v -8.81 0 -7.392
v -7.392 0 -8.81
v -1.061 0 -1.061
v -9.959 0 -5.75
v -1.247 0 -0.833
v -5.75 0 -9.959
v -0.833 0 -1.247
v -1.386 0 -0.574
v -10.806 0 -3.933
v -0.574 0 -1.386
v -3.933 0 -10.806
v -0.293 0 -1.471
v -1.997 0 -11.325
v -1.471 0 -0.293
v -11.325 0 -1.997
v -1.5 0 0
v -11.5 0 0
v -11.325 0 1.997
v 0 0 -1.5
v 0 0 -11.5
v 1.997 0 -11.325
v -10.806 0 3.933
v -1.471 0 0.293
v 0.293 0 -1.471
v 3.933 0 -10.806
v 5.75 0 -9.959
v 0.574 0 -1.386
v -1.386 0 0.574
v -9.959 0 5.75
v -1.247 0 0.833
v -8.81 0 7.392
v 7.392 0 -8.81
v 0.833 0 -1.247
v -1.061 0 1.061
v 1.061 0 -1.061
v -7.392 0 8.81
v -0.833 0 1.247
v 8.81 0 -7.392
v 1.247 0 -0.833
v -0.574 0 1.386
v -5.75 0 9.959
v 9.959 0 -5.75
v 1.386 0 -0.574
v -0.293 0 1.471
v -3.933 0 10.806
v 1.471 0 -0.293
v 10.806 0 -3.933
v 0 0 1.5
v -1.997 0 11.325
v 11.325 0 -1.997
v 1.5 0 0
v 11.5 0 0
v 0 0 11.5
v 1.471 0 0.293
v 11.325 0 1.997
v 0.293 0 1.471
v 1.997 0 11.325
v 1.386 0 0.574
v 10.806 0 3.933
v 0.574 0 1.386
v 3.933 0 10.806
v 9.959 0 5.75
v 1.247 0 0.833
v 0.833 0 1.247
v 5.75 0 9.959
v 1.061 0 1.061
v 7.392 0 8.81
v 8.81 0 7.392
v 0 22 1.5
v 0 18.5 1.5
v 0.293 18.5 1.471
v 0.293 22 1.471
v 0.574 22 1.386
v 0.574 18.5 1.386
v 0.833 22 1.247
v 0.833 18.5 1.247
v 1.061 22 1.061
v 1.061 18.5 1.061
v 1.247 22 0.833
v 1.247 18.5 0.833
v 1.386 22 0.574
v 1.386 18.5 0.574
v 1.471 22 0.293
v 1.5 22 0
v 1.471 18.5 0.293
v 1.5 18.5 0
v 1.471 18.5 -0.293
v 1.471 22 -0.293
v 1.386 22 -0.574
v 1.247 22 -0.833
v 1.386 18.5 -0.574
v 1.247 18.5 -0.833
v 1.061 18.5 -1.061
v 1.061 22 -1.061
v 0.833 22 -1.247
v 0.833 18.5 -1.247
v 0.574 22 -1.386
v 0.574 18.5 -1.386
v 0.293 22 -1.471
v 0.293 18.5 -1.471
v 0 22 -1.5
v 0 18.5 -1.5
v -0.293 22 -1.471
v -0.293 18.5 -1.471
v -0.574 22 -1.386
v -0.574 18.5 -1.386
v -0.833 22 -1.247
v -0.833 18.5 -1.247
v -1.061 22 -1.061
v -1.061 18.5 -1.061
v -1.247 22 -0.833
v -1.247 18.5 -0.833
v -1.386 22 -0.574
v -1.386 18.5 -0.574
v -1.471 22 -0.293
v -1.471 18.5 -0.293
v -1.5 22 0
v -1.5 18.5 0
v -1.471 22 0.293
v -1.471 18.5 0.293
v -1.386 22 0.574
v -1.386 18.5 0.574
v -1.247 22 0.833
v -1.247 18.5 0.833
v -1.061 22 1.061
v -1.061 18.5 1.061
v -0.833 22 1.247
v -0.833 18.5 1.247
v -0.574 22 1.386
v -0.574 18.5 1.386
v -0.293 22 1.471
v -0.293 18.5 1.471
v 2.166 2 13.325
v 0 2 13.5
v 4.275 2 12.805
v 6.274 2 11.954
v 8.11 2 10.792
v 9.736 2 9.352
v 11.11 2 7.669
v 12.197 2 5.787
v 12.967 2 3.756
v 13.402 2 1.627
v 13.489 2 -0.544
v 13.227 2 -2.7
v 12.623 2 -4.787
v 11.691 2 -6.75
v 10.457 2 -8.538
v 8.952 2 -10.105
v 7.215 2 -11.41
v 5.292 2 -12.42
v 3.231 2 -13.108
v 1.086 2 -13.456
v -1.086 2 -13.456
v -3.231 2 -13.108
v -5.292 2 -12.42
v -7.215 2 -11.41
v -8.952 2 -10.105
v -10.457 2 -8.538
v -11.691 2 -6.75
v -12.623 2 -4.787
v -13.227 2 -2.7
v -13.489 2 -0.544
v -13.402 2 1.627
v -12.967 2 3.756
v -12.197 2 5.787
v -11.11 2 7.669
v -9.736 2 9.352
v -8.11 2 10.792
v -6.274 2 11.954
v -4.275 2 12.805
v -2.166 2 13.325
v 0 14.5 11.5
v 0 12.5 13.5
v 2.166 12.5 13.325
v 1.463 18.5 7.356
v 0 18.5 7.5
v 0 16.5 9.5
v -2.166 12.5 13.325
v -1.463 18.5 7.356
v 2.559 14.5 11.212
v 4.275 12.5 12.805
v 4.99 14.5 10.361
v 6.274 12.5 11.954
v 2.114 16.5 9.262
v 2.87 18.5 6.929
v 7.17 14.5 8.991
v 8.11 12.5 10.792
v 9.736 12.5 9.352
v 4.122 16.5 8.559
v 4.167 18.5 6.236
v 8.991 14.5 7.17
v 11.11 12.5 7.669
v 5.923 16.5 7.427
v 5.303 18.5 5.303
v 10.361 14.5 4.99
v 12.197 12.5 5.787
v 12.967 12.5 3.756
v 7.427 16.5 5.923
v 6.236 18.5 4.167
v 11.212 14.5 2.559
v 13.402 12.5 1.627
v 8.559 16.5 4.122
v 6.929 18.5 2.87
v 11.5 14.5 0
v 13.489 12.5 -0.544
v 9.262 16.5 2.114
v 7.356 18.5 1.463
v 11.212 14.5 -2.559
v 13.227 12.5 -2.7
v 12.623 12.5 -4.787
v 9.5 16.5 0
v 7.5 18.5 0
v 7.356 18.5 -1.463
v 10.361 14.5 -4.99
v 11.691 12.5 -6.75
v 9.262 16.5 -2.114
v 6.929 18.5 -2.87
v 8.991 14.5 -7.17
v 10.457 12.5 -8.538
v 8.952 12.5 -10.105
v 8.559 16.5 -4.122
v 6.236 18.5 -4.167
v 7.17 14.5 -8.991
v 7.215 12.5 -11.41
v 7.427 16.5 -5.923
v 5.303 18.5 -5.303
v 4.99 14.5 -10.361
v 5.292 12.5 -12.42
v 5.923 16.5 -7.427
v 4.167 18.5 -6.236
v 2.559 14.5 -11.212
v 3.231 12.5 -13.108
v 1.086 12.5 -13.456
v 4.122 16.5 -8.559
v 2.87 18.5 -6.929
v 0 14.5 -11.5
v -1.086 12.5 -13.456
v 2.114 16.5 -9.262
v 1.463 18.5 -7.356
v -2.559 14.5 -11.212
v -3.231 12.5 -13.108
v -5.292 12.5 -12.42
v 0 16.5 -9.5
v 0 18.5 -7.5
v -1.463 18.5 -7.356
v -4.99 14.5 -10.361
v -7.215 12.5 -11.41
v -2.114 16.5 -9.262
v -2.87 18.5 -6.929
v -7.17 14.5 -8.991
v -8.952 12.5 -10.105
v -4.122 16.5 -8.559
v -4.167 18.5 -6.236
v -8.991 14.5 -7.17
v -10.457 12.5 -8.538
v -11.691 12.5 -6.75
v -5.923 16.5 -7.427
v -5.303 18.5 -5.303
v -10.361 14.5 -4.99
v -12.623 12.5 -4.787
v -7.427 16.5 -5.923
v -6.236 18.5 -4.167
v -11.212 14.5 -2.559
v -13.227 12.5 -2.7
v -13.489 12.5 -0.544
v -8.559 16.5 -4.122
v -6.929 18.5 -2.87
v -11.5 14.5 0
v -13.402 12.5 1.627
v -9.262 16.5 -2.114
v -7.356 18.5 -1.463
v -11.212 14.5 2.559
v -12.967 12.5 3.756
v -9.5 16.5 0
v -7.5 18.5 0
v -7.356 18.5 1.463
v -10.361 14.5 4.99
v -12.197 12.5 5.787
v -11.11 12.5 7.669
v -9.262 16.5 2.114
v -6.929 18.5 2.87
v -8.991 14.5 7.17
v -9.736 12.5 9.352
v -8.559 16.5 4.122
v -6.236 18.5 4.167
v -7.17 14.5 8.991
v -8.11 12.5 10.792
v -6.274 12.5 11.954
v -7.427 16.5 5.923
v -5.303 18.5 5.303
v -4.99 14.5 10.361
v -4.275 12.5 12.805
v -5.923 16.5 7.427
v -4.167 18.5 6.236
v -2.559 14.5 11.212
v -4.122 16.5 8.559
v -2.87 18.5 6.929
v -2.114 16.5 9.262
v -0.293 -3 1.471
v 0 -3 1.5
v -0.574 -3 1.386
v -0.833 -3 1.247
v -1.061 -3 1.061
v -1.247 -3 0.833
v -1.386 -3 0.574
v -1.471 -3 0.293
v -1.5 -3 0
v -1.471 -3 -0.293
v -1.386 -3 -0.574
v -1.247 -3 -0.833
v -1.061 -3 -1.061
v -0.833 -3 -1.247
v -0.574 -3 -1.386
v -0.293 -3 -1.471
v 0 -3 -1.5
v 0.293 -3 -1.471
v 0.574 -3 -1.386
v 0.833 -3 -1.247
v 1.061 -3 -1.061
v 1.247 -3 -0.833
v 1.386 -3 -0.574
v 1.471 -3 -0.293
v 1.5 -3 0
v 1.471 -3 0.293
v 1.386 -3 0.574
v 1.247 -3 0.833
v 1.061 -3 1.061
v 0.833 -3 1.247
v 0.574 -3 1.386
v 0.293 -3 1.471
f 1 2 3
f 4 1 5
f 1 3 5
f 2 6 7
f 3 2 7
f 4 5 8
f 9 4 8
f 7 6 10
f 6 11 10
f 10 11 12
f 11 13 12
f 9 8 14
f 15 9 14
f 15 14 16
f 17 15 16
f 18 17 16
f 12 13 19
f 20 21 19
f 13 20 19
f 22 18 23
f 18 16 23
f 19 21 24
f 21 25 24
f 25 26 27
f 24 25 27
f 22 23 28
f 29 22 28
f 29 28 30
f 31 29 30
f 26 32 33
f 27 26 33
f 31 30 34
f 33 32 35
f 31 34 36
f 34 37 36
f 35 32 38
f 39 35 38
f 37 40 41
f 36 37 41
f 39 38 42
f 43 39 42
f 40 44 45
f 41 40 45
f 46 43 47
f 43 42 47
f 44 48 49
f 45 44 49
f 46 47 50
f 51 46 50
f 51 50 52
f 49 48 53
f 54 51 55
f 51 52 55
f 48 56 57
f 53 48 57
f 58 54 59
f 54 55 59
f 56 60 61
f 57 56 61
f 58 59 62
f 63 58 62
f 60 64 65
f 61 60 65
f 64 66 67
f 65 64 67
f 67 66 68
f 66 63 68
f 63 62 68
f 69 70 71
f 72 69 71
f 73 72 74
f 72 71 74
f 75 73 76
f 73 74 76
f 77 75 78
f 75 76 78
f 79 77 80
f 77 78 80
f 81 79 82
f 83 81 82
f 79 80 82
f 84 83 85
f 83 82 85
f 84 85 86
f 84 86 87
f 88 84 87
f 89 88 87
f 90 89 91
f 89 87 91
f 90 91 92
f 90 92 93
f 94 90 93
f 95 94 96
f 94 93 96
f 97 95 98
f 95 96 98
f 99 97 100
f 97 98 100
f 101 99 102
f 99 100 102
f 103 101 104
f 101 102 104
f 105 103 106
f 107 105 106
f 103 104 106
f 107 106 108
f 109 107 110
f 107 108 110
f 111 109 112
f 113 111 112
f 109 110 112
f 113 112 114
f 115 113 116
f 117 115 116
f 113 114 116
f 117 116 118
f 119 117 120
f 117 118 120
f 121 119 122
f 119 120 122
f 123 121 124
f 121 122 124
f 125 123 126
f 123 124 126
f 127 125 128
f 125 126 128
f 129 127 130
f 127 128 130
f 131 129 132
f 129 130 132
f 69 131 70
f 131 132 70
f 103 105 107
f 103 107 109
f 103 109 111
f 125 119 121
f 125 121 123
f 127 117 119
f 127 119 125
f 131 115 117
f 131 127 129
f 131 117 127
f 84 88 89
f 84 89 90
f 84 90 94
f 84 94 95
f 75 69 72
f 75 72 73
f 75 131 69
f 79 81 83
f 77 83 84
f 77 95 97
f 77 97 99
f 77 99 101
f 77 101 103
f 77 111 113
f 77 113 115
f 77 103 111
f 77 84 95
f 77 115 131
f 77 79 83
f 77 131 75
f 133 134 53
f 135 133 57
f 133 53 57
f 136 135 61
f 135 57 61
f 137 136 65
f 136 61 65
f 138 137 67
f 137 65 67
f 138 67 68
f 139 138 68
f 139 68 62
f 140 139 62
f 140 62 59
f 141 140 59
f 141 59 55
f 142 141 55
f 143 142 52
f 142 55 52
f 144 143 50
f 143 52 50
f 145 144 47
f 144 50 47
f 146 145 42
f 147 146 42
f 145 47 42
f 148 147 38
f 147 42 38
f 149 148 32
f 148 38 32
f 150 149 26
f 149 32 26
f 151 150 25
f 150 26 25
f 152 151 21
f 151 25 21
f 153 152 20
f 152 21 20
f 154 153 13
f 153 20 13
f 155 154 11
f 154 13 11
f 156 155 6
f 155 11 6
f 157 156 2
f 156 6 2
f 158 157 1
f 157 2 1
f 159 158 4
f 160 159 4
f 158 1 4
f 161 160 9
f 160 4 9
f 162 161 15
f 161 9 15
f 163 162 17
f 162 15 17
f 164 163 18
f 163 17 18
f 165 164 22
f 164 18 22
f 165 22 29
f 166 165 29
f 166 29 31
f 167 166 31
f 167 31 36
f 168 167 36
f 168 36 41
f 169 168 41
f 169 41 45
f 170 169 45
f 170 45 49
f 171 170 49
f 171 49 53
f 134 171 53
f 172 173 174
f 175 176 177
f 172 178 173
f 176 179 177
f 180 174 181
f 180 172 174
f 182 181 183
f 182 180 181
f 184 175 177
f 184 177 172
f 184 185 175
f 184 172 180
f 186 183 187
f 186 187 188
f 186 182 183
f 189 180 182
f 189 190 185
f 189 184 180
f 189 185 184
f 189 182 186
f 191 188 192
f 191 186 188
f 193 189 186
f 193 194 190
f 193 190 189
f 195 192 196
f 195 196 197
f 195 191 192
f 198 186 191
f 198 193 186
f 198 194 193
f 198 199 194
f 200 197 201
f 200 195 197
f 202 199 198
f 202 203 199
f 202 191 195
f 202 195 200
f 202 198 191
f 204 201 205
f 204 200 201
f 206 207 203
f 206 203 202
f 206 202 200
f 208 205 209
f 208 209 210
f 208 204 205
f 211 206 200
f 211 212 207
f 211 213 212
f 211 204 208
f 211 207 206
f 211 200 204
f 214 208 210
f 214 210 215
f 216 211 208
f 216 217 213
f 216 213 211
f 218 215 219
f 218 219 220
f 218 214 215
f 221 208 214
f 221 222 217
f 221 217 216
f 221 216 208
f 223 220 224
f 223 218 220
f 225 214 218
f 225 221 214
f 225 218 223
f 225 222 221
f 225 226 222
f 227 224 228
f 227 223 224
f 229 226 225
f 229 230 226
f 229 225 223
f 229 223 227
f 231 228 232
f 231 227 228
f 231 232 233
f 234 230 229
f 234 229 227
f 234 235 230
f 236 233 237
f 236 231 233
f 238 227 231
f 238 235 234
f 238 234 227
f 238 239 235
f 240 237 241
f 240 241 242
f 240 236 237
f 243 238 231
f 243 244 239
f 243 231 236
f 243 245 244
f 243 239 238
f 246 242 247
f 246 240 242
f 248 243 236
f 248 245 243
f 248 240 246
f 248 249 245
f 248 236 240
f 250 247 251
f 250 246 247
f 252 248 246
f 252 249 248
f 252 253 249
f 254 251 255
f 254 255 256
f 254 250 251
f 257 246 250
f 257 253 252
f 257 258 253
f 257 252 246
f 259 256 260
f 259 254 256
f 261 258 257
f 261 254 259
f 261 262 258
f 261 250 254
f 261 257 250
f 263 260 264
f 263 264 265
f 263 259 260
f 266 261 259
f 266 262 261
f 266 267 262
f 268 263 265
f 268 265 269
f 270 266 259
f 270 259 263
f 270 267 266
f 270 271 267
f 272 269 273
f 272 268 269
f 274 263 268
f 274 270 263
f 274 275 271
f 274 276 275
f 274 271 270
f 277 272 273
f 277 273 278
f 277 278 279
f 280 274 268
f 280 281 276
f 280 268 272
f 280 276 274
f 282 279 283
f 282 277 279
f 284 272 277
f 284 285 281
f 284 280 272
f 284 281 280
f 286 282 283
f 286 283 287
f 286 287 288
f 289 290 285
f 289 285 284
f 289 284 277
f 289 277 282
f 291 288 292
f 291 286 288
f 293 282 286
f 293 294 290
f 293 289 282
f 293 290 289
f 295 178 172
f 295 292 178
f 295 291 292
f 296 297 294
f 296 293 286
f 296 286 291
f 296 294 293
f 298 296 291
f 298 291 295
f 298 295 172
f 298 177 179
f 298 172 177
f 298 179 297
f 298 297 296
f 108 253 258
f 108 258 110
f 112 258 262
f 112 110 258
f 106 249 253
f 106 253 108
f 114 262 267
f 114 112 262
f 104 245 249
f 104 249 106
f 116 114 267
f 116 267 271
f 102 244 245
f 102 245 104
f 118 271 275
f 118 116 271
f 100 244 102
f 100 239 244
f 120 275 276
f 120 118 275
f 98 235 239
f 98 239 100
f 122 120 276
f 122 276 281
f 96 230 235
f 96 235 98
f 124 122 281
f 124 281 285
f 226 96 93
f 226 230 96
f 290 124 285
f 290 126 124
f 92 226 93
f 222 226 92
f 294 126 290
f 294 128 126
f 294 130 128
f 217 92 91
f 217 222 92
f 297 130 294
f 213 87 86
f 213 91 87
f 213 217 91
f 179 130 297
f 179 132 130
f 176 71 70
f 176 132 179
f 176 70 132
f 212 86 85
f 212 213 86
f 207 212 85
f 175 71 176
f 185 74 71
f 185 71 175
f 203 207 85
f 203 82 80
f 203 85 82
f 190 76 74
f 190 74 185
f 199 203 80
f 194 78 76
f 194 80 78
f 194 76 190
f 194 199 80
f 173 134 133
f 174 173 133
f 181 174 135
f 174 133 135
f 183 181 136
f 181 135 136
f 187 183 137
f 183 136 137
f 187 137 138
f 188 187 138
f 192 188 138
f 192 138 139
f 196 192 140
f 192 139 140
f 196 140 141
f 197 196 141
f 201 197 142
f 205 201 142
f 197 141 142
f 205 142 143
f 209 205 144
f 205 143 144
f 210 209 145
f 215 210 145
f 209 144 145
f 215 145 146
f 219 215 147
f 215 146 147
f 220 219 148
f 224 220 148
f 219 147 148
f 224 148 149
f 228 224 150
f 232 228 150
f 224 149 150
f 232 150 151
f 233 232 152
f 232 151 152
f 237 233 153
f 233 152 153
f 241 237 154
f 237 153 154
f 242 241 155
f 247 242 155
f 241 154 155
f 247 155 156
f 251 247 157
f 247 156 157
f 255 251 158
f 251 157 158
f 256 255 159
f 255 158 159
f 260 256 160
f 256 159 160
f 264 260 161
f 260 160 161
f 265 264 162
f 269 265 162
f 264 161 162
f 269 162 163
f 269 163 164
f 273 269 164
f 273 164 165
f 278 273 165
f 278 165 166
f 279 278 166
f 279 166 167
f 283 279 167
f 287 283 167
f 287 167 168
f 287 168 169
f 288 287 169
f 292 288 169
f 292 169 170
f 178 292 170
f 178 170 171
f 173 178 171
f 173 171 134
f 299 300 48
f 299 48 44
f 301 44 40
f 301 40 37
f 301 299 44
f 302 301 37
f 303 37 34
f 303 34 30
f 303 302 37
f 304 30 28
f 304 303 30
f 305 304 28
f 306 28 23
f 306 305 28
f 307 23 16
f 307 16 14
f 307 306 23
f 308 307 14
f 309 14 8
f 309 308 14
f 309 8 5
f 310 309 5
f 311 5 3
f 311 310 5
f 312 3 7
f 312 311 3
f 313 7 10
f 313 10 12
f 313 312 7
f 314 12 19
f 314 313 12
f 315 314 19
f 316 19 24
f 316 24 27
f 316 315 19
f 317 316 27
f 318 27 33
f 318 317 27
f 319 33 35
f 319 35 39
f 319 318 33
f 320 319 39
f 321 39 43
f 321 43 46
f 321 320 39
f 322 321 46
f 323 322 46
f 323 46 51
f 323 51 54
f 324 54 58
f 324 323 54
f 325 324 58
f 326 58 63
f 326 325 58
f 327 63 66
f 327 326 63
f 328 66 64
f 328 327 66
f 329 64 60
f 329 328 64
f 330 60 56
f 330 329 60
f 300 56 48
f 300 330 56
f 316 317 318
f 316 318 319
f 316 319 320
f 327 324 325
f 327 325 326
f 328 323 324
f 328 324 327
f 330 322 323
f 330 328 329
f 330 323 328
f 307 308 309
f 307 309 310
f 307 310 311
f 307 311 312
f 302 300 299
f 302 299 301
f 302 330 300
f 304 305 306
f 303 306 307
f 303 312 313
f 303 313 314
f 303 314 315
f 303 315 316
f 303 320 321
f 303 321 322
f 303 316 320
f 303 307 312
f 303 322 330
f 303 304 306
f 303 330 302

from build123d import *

# Parameters (mm, degrees)
SKETCH1_R           = 13.5
BOSS_EXTRUDE1_DEPTH = 18.5
SKETCH2_R           = 1.5
BOSS_EXTRUDE2_DEPTH = 3.5
BOSS_EXTRUDE3_START = 3
SKETCH3_R           = 1.5
BOSS_EXTRUDE3_DEPTH = 3
CHAMFER1_SIZE       = 6
CHAMFER2_SIZE       = 2


with BuildPart() as part:
    # Sketch1 → Boss-Extrude1 (new body)
    with BuildSketch(Plane(origin=(0, 0, 0), x_dir=(1, 0, 0), z_dir=(0, 1, 0))):
        with Locations(Location((0, 0, 0), (0, 0, 270))):
            Circle(SKETCH1_R)
    extrude(amount=BOSS_EXTRUDE1_DEPTH)

    # Sketch2 → Boss-Extrude2 (add)
    with BuildSketch(Plane(origin=(0, 18.5, 0), x_dir=(1, 0, 0), z_dir=(0, 1, 0))):
        with Locations(Location((0, 0, 0), (0, 0, 270))):
            Circle(SKETCH2_R)
    extrude(amount=BOSS_EXTRUDE2_DEPTH)

    # Sketch3 → Boss-Extrude3 (add)
    with BuildSketch(Plane.XZ.offset(BOSS_EXTRUDE3_START)):
        with Locations(Location((0, 0, 0), (0, 0, 90))):
            Circle(SKETCH3_R)
    extrude(amount=-BOSS_EXTRUDE3_DEPTH)

    # Chamfer1
    chamfer1_edges = [part.edges().sort_by_distance(p)[0] for p in [
        (0, 18.5, -13.5),
    ]]
    chamfer(chamfer1_edges, length=CHAMFER1_SIZE)

    # Chamfer2
    chamfer2_edges = [part.edges().sort_by_distance(p)[0] for p in [
        (0, 0, -13.5),
    ]]
    chamfer(chamfer2_edges, length=CHAMFER2_SIZE)


solid = part.part
